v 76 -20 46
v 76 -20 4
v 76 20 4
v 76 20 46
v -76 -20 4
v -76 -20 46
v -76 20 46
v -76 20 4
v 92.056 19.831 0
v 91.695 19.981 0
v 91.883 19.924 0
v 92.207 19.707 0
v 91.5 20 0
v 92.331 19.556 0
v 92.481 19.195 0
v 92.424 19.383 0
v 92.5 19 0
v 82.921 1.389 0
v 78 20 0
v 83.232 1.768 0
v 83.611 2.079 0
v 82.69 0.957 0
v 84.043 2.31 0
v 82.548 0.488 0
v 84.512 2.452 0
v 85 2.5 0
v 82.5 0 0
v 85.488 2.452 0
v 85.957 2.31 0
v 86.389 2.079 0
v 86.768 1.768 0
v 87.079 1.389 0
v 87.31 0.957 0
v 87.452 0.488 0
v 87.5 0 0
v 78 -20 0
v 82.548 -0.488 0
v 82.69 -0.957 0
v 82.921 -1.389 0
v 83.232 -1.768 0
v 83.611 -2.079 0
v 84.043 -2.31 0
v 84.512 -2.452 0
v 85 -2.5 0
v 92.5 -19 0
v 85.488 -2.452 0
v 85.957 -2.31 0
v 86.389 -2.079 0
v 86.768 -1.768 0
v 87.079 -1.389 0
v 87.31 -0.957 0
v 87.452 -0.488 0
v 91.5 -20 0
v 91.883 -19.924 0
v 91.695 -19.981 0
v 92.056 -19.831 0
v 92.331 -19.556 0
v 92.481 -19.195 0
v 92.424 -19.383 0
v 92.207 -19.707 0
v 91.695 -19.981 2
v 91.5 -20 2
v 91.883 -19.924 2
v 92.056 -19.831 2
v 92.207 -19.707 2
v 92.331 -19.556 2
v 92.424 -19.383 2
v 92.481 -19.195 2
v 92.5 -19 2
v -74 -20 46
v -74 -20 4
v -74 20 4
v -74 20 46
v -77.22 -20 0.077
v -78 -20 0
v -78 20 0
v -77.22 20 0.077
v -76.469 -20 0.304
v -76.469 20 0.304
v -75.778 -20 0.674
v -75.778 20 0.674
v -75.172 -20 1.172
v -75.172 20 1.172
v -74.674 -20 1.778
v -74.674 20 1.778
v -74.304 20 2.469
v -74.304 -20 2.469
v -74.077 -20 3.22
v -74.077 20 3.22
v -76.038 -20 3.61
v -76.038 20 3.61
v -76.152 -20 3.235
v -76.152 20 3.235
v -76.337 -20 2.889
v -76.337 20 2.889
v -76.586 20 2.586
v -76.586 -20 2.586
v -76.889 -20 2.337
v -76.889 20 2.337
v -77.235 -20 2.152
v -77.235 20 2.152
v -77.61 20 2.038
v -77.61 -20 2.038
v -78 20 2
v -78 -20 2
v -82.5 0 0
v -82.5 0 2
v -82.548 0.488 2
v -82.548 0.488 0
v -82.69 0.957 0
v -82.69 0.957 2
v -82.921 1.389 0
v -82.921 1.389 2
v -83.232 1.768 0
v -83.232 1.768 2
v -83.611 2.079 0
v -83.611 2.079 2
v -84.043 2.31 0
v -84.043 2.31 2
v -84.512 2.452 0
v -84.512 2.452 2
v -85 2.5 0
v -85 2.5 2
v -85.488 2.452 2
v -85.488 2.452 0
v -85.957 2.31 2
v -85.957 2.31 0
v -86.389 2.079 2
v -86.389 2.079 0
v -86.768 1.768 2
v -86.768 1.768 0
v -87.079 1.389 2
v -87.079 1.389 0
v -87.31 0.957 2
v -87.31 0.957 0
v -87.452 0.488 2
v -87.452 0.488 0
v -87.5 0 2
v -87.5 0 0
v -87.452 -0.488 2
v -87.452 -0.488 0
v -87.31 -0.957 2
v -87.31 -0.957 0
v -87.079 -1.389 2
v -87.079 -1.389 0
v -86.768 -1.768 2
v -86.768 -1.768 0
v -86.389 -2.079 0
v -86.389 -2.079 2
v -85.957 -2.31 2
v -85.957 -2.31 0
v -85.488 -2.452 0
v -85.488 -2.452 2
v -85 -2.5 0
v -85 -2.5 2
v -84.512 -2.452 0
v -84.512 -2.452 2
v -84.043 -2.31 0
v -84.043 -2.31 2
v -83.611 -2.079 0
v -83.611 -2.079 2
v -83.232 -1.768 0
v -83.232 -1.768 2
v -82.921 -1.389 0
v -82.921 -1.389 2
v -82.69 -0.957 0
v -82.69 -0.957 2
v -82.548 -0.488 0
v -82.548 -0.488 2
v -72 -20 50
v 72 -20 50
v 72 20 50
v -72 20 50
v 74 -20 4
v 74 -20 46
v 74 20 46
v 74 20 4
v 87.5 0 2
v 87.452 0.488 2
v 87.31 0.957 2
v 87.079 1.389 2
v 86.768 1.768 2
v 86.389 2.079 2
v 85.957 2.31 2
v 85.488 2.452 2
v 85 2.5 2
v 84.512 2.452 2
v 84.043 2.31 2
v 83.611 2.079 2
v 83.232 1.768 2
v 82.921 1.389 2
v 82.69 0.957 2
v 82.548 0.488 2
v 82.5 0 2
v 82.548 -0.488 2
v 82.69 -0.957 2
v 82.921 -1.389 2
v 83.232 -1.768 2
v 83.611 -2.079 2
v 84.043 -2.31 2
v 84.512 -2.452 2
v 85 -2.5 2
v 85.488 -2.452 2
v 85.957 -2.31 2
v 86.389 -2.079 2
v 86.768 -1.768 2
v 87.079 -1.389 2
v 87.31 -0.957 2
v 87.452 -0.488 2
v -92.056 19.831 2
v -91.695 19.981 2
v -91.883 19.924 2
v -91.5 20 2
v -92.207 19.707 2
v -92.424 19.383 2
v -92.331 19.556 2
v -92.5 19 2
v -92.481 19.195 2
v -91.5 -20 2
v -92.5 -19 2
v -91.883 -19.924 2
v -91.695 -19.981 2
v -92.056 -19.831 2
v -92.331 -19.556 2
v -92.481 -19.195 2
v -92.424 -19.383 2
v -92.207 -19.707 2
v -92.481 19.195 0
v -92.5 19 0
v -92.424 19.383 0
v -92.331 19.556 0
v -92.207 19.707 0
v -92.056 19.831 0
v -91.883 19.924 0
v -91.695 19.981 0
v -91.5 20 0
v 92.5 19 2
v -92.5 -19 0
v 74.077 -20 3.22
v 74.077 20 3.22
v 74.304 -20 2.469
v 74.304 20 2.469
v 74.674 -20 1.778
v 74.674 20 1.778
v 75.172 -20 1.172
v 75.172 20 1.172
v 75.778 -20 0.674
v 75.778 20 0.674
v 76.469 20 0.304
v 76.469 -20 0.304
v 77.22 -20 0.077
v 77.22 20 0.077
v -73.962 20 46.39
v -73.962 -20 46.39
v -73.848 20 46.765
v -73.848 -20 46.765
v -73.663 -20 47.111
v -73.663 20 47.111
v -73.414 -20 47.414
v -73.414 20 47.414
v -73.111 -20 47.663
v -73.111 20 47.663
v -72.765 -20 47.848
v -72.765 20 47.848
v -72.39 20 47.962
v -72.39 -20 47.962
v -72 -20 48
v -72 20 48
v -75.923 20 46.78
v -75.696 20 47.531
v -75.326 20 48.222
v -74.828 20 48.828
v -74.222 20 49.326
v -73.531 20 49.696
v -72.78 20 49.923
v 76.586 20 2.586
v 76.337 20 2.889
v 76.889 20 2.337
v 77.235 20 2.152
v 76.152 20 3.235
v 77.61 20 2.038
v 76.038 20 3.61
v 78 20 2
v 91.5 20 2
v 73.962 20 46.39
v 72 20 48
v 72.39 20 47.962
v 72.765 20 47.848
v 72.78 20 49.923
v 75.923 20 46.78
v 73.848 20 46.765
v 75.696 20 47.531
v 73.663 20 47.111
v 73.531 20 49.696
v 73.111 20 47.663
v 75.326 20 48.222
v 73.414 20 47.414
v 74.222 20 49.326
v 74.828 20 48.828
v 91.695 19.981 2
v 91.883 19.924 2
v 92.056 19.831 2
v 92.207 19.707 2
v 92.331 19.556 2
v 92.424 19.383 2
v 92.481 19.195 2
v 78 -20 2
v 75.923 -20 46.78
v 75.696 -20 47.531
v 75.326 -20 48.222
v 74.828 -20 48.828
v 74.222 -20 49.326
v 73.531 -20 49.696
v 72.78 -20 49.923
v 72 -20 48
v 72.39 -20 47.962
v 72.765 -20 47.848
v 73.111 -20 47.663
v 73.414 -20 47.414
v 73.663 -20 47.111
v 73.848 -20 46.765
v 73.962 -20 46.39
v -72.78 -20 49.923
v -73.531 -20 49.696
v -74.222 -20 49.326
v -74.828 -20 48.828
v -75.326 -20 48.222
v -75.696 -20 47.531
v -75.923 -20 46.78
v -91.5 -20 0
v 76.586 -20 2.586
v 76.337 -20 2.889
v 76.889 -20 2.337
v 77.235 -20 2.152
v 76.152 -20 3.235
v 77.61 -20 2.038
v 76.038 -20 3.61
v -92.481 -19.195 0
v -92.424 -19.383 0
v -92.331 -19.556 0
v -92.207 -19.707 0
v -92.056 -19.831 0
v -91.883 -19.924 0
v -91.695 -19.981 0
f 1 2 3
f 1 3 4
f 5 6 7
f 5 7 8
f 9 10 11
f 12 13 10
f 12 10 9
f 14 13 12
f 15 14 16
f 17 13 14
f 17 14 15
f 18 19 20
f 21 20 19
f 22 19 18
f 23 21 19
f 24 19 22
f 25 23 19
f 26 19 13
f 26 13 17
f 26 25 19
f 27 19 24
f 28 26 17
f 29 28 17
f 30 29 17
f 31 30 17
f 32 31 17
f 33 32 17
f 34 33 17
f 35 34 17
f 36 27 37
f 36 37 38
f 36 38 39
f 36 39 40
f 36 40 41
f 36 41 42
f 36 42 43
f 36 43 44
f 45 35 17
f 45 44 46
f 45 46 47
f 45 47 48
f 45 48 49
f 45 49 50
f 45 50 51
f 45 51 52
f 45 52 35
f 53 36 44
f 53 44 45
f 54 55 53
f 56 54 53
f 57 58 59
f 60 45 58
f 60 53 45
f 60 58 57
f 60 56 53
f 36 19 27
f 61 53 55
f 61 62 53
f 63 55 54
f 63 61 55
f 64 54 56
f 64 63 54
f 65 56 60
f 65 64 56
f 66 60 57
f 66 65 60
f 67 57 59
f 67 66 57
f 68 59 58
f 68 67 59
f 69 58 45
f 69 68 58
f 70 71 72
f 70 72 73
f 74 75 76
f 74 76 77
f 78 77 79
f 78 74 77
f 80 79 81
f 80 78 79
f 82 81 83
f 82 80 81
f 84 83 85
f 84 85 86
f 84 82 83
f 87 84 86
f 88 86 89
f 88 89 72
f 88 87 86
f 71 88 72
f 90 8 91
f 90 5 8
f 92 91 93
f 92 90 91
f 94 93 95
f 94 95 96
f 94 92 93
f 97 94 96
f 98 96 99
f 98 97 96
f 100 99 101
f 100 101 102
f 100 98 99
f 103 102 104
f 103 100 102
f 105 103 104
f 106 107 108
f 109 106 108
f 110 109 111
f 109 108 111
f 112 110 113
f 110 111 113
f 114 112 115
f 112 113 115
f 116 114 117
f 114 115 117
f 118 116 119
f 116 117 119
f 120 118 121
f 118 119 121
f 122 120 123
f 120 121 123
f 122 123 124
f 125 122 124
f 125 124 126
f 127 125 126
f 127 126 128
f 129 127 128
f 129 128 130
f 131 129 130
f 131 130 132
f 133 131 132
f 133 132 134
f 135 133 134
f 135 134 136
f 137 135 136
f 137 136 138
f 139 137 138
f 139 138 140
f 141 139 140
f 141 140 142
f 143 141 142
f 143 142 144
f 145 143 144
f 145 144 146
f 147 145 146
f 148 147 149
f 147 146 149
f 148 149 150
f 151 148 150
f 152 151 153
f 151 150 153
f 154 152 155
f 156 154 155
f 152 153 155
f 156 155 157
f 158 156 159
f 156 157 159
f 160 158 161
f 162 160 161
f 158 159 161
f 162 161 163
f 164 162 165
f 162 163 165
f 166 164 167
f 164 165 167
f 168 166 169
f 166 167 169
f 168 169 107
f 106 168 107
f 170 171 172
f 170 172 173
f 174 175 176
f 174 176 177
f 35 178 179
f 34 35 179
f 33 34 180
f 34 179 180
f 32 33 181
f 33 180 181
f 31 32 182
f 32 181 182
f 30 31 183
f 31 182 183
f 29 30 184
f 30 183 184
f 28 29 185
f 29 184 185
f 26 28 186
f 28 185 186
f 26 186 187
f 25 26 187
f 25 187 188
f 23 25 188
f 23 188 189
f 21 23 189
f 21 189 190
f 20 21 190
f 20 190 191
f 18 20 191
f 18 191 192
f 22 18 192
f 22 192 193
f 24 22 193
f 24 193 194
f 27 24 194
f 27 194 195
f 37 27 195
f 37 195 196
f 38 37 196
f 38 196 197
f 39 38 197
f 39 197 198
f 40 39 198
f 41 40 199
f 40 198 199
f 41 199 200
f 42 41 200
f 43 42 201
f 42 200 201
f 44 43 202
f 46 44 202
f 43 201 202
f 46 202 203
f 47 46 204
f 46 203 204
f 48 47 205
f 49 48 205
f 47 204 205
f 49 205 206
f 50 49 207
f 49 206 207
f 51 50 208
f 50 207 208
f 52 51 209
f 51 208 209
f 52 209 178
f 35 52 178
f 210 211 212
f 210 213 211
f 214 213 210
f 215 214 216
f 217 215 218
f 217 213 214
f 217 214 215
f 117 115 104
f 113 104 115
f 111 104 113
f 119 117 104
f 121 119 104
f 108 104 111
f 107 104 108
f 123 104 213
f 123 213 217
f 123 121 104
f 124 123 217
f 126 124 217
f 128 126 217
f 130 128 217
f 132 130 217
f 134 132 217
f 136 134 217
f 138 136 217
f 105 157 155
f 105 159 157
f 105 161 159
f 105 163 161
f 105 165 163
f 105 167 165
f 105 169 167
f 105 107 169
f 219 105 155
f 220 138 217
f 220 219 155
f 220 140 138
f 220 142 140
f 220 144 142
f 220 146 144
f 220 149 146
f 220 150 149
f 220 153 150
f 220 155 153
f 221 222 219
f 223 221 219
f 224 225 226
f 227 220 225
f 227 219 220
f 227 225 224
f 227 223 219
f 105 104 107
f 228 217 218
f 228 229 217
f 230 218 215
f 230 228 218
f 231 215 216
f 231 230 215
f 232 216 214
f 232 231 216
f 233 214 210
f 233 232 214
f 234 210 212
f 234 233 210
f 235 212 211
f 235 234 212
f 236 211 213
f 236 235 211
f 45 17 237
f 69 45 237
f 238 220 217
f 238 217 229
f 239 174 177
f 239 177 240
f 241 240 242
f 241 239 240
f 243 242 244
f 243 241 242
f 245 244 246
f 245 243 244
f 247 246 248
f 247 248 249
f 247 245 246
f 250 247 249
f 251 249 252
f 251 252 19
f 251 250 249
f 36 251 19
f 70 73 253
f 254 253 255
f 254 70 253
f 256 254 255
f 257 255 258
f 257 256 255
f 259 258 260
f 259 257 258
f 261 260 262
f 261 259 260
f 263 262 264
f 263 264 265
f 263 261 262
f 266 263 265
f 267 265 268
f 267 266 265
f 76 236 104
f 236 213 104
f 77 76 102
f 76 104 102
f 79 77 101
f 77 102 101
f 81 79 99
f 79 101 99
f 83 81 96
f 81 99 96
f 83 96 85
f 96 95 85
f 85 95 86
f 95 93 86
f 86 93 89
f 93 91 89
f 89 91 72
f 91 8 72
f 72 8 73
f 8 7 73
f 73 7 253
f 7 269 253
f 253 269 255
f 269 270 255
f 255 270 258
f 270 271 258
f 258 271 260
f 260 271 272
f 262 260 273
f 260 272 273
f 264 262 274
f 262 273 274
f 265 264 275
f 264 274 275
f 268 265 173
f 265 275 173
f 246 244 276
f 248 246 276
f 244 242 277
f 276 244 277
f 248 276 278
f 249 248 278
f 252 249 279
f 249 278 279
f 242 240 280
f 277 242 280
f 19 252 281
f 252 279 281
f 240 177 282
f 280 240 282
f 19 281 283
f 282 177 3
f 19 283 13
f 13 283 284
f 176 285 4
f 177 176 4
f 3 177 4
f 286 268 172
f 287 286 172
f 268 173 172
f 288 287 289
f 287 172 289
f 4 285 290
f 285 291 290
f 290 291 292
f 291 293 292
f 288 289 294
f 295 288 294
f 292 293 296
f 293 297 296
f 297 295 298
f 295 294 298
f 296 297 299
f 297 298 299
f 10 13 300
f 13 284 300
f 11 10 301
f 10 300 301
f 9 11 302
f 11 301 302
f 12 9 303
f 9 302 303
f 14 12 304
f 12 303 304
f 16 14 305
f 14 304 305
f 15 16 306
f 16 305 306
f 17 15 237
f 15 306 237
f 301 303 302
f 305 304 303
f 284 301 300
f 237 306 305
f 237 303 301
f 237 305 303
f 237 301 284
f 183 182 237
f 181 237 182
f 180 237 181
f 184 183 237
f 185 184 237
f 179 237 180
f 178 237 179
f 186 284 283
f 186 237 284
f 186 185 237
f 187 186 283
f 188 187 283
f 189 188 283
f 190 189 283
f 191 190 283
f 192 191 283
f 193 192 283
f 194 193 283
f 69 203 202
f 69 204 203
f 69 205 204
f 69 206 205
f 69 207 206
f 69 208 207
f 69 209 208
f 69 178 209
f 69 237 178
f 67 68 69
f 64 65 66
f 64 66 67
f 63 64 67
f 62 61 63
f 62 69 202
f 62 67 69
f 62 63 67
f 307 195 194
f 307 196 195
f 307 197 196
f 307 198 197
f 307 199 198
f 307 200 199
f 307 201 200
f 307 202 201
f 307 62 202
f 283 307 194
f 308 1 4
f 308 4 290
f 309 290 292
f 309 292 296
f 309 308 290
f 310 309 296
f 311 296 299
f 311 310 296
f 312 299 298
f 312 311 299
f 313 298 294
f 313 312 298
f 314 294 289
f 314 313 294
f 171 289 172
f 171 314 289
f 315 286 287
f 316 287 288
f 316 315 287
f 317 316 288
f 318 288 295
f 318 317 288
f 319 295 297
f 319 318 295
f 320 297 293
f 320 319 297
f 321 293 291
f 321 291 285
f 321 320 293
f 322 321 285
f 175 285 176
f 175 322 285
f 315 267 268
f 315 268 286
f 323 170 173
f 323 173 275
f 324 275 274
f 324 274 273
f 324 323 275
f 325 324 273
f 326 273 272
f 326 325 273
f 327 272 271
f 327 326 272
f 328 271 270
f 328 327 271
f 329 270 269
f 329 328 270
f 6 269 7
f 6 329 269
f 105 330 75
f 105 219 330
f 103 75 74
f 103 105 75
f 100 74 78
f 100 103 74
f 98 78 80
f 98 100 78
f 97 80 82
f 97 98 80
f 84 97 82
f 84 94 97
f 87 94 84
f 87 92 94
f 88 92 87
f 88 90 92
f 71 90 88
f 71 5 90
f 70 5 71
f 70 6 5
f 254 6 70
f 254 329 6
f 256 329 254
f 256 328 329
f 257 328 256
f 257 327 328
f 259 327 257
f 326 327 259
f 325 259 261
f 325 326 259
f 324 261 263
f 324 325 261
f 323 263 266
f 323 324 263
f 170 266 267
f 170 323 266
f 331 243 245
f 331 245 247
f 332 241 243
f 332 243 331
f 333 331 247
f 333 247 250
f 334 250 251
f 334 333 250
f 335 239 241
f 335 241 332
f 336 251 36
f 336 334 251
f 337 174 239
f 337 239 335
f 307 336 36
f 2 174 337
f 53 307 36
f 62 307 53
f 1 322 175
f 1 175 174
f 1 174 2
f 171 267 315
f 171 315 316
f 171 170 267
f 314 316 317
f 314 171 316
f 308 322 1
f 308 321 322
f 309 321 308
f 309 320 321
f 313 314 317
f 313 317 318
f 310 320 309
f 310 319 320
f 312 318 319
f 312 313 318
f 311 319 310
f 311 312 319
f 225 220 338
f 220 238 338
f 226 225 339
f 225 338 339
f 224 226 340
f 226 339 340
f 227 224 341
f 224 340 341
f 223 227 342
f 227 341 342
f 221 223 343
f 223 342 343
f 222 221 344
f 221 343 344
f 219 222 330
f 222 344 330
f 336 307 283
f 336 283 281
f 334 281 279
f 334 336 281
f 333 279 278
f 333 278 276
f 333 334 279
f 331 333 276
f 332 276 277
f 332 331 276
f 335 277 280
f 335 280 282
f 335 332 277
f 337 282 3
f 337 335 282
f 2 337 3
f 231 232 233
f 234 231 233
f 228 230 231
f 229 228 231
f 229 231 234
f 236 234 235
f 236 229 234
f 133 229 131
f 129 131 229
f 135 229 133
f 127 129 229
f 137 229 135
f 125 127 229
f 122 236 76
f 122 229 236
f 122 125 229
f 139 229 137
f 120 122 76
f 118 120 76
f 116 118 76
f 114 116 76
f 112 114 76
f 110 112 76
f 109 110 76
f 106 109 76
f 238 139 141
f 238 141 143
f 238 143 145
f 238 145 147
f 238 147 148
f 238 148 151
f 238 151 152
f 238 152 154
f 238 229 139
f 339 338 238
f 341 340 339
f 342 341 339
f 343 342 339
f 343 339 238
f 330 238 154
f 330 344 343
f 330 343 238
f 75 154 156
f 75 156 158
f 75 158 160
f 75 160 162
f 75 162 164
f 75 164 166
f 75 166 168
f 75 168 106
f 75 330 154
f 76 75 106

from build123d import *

# Parameters (mm, degrees)
F1_DEPTH = 20
F2_R     = 2.5
F3_DEPTH = 2.001
F4_R     = 1


with BuildPart() as f1:
    # F0 (on Front) → F1 (new body, symmetric)
    with BuildSketch(Plane.XZ):
        with BuildLine():
            Line((-92.5, 2), (-92.5, 0))
            Line((-92.5, 0), (-78, 0))
            ThreePointArc((-78, 0), (-75.171573, 1.171573), (-74, 4))
            Line((-74, 4), (-74, 46))
            ThreePointArc((-74, 46), (-73.414214, 47.414214), (-72, 48))
            Line((-72, 48), (0, 48))
            Line((0, 48), (72, 48))
            ThreePointArc((72, 48), (73.414214, 47.414214), (74, 46))
            Line((74, 46), (74, 4))
            ThreePointArc((74, 4), (75.171573, 1.171573), (78, 0))
            Line((78, 0), (92.5, 0))
            Line((92.5, 0), (92.5, 2))
            Line((92.5, 2), (78, 2))
            ThreePointArc((78, 2), (76.585786, 2.585786), (76, 4))
            Line((76, 4), (76, 46))
            ThreePointArc((76, 46), (74.828427, 48.828427), (72, 50))
            Line((72, 50), (0, 50))
            Line((0, 50), (-72, 50))
            ThreePointArc((-72, 50), (-74.828427, 48.828427), (-76, 46))
            Line((-76, 46), (-76, 4))
            ThreePointArc((-76, 4), (-76.585786, 2.585786), (-78, 2))
            Line((-78, 2), (-92.5, 2))
        make_face()
    extrude(amount=F1_DEPTH, both=True)

    # F2 (on face) → F3 (cut, through all)
    with BuildSketch(Plane.XY.offset(2)):
        with Locations((-85, 0)):
            Circle(F2_R)
        with Locations((85, 0)):
            Circle(F2_R)
    extrude(amount=-F3_DEPTH, mode=Mode.SUBTRACT)

    # F4
    f4_edges = [f1.edges().sort_by_distance(p)[0] for p in [
        (-92.5, -20, 1),
        (-92.5, 20, 1),
        (92.5, -20, 1),
        (92.5, 20, 1),
    ]]
    fillet(f4_edges, radius=F4_R)


solid = f1.part
